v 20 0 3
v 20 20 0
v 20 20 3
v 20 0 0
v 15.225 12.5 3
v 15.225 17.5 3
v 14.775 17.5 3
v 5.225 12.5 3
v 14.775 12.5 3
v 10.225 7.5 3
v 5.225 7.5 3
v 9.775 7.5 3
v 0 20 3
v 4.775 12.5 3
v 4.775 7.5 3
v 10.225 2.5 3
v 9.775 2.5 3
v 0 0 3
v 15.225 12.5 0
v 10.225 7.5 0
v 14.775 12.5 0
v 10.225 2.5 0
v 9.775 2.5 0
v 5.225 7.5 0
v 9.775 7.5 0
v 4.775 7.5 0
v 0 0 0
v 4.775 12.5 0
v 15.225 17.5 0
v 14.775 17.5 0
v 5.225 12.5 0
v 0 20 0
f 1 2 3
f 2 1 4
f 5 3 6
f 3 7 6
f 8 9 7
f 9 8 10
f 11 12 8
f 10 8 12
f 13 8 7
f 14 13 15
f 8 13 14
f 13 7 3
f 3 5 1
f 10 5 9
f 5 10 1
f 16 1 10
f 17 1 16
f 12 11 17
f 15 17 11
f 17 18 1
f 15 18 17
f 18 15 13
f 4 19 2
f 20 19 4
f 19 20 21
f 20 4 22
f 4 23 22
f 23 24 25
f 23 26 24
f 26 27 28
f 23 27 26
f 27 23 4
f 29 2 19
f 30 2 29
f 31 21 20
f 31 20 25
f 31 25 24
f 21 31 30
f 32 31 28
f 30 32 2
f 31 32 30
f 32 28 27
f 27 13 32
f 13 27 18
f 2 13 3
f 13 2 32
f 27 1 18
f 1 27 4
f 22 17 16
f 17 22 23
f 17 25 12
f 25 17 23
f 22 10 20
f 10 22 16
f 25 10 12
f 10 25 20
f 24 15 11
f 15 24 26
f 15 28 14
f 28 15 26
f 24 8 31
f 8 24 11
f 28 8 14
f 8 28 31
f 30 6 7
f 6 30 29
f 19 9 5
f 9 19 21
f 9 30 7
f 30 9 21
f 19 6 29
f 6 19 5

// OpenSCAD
difference() {
	cube([20, 20, 3]);
	translate([10, 5, 1.5]) {
		rotate([0, 0, 90]) {
			cube([5, 0.45, 5], center=true);
		}
	}
	translate([5, 10, 1.5]) {
		rotate([0, 0, 90]) {
			cube([5, 0.45, 5], center=true);
		}
	}
	translate([15, 15, 1.5]) {
		rotate([0, 0, 90]) {
			cube([5, 0.45, 5], center=true);
		}
	}
}
